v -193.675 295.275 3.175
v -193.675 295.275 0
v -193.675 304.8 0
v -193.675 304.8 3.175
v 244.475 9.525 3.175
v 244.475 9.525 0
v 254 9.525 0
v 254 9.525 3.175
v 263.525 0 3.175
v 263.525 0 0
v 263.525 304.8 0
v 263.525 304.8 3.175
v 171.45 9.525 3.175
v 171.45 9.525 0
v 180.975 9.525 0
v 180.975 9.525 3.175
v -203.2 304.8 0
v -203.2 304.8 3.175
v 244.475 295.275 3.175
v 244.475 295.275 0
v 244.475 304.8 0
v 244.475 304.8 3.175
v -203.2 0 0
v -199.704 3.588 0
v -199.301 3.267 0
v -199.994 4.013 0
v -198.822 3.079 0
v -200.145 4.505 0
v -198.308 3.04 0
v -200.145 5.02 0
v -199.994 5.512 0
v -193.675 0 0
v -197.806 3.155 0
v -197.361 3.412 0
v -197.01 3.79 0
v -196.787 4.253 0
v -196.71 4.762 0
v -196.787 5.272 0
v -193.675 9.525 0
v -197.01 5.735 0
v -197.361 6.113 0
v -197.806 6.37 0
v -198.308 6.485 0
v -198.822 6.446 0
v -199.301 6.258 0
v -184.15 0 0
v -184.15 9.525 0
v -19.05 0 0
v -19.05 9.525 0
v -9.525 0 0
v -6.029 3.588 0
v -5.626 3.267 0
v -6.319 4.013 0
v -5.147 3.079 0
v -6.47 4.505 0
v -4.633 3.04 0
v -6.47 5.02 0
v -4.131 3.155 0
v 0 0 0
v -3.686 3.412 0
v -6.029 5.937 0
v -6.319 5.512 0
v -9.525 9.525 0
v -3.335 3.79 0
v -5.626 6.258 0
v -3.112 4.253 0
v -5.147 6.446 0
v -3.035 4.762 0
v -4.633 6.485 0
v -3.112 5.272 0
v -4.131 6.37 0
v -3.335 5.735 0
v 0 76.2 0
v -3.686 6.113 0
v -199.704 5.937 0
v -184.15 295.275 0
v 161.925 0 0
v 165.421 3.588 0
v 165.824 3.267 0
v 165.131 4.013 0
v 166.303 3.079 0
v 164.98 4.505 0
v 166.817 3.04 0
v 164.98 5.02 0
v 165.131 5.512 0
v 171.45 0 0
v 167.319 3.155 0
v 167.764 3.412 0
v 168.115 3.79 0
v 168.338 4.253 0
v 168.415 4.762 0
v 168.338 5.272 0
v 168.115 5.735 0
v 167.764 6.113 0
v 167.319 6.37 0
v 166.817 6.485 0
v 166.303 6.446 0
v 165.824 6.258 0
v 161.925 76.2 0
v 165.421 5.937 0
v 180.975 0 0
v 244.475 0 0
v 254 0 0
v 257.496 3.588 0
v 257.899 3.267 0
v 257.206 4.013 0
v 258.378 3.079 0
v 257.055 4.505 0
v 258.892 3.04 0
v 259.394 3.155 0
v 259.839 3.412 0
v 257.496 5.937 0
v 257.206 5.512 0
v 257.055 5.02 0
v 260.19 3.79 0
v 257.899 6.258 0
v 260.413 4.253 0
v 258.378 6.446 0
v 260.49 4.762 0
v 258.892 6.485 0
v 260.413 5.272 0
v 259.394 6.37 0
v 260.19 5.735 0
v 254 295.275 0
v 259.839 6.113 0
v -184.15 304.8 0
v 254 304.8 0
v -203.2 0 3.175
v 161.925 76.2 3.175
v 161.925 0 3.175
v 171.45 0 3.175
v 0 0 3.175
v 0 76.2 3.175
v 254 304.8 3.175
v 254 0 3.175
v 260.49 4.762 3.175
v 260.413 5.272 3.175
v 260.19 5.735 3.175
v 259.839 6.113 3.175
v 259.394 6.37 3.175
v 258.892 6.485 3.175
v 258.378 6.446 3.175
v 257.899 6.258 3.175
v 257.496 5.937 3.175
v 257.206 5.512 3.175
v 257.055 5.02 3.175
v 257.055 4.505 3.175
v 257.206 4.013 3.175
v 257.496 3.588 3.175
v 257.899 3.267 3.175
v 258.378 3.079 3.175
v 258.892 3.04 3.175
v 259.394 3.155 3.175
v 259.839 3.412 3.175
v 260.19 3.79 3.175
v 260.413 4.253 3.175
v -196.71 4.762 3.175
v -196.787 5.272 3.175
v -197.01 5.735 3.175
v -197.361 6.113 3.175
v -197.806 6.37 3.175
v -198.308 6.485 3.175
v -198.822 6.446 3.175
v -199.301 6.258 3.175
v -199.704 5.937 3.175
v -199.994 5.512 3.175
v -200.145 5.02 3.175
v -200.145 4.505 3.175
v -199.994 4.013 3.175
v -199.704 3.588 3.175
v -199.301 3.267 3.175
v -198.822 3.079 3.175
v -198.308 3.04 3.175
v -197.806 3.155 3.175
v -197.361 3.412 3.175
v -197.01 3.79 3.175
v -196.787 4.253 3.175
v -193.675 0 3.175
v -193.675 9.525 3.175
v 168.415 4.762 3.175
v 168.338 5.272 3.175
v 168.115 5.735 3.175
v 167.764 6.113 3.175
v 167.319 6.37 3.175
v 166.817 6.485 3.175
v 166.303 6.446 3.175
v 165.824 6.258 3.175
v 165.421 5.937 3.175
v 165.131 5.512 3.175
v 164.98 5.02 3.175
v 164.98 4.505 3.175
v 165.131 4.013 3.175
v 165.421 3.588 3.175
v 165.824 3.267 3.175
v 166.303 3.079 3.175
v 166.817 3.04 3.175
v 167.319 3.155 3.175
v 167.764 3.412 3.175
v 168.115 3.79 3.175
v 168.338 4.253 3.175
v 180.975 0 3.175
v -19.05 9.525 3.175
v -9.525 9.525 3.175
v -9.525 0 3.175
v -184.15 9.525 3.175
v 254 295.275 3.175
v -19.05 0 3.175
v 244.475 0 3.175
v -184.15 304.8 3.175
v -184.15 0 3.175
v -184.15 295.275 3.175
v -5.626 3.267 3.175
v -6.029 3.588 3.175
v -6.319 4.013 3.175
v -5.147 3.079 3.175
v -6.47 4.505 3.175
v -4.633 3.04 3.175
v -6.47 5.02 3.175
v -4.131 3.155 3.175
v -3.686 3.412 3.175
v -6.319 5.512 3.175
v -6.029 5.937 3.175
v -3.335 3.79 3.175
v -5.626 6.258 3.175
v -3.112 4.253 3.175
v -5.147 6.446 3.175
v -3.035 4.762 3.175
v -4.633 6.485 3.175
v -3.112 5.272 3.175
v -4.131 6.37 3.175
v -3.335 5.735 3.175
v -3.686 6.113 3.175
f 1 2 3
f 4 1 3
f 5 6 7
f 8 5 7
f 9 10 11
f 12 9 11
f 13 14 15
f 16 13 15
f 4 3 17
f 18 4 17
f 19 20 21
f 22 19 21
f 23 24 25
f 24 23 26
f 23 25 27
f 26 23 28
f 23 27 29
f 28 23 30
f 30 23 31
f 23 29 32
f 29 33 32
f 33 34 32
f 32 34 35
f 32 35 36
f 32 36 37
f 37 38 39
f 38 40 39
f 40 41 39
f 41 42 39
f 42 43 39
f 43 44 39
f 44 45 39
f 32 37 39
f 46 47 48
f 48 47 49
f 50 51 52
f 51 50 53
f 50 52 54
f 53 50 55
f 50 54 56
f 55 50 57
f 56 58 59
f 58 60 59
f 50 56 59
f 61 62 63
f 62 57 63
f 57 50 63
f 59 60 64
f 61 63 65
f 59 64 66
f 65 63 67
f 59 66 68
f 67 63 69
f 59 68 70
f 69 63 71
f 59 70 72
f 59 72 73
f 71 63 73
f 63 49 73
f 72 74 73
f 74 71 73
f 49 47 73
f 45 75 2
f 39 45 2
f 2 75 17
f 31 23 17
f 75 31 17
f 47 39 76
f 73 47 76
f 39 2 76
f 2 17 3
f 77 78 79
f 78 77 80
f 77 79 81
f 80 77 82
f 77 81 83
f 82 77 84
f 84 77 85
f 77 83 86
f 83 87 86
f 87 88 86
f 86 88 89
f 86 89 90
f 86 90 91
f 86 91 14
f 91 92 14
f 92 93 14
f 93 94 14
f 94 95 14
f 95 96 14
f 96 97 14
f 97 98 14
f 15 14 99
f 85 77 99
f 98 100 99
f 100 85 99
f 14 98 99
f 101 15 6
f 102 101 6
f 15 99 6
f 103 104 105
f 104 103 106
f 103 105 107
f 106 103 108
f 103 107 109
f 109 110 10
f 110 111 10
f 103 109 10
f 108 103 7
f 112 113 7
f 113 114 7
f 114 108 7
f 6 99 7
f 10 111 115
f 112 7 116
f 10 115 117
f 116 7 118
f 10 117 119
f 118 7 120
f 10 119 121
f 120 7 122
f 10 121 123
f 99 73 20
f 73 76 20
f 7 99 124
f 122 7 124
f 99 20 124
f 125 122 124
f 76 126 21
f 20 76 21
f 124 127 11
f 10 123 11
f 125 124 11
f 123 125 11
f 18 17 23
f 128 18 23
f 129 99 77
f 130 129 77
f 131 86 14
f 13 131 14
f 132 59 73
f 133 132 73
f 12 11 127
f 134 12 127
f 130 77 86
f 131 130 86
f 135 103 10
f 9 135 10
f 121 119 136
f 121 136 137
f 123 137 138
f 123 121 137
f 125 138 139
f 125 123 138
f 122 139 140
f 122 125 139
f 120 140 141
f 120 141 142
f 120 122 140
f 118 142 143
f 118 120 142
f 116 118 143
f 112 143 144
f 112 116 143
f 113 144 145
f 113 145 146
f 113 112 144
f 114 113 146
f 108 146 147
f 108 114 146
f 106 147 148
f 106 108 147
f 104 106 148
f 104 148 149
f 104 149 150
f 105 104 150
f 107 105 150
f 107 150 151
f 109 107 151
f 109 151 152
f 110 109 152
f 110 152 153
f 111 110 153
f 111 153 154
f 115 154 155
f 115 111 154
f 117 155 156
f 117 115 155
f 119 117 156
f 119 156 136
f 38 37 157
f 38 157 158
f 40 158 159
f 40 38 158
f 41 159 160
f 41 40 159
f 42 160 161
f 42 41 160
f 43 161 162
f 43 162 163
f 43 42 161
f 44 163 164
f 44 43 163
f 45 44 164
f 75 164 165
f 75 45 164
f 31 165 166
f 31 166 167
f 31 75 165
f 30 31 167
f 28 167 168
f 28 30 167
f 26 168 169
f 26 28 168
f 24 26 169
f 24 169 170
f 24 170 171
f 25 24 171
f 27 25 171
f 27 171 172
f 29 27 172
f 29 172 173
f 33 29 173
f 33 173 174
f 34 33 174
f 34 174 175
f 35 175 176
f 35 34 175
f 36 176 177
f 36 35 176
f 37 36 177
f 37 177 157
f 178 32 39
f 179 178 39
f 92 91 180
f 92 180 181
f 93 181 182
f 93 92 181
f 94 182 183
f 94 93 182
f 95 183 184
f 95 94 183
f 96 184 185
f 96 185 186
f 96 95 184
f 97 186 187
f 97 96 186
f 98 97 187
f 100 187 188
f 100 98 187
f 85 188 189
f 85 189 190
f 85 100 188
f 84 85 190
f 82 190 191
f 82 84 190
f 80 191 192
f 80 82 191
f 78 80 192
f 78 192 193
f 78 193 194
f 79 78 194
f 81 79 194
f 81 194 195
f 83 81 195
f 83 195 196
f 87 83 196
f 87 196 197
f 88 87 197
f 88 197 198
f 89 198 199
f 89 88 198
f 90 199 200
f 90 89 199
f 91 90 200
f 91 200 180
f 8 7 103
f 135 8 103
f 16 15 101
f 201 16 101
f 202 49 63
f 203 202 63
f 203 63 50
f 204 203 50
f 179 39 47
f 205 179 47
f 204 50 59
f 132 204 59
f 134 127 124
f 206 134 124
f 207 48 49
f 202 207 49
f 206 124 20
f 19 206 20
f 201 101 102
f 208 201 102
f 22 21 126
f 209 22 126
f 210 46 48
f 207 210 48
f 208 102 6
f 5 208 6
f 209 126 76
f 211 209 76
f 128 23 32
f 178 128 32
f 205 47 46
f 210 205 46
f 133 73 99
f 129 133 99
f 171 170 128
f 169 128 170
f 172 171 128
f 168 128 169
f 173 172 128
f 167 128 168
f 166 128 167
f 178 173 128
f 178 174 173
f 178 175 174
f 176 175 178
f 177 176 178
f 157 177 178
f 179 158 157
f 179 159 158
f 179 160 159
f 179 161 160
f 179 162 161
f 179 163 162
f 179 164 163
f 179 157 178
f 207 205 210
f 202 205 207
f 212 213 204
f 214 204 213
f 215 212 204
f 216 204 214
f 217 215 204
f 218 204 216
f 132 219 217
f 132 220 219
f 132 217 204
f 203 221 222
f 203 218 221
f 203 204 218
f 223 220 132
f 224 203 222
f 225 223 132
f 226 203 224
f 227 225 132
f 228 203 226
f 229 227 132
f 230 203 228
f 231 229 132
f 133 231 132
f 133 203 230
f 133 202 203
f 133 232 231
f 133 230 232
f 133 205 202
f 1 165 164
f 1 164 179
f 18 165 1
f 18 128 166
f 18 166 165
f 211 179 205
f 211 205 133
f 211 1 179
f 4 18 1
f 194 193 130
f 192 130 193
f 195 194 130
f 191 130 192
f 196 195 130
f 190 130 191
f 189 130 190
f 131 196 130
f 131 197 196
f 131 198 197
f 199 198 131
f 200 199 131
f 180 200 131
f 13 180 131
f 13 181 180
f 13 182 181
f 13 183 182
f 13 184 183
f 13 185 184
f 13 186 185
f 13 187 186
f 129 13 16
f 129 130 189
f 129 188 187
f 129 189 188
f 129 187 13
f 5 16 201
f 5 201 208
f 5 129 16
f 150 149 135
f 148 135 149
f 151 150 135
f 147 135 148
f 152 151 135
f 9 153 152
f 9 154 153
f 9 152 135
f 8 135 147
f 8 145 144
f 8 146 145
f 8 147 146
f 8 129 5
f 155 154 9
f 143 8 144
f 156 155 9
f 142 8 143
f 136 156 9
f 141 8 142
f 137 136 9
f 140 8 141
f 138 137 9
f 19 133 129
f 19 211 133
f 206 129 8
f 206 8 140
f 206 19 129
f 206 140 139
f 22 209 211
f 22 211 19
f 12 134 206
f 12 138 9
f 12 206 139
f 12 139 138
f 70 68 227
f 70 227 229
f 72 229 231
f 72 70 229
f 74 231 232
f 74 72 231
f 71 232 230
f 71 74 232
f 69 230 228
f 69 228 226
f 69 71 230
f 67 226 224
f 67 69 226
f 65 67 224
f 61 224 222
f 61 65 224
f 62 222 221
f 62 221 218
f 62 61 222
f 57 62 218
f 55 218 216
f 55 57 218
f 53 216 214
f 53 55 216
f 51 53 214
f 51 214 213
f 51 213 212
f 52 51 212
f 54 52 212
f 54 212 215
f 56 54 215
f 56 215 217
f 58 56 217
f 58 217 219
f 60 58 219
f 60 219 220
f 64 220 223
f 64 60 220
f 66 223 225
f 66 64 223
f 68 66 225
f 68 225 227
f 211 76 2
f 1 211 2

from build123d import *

# Parameters (mm, degrees)
F0_R     = 1.7272
F1_DEPTH = 3.175


with BuildPart() as f1:
    # F0 (on Top) → F1 (new body)
    with BuildSketch(Plane.XY):
        Polygon((0, 0), (0, 76.2), (161.925, 76.2), (161.925, 0), (171.45, 0), (171.45, 9.525), (180.975, 9.525), (180.975, 0), (244.475, 0), (244.475, 9.525), (254, 9.525), (254, 0), (263.525, 0), (263.525, 304.8), (254, 304.8), (254, 295.275), (244.475, 295.275), (244.475, 304.8), (-184.15, 304.8), (-184.15, 295.275), (-193.675, 295.275), (-193.675, 304.8), (-203.2, 304.8), (-203.2, 0), (-193.675, 0), (-193.675, 9.525), (-184.15, 9.525), (-184.15, 0), (-19.05, 0), (-19.05, 9.525), (-9.525, 9.525), (-9.525, 0), align=None)
        with Locations((-198.4375, 4.7625)):
            Circle(F0_R, mode=Mode.SUBTRACT)
        with Locations((-4.7625, 4.7625)):
            Circle(F0_R, mode=Mode.SUBTRACT)
        with Locations((166.6875, 4.7625)):
            Circle(F0_R, mode=Mode.SUBTRACT)
        with Locations((258.7625, 4.7625)):
            Circle(F0_R, mode=Mode.SUBTRACT)
    extrude(amount=F1_DEPTH)


solid = f1.part
